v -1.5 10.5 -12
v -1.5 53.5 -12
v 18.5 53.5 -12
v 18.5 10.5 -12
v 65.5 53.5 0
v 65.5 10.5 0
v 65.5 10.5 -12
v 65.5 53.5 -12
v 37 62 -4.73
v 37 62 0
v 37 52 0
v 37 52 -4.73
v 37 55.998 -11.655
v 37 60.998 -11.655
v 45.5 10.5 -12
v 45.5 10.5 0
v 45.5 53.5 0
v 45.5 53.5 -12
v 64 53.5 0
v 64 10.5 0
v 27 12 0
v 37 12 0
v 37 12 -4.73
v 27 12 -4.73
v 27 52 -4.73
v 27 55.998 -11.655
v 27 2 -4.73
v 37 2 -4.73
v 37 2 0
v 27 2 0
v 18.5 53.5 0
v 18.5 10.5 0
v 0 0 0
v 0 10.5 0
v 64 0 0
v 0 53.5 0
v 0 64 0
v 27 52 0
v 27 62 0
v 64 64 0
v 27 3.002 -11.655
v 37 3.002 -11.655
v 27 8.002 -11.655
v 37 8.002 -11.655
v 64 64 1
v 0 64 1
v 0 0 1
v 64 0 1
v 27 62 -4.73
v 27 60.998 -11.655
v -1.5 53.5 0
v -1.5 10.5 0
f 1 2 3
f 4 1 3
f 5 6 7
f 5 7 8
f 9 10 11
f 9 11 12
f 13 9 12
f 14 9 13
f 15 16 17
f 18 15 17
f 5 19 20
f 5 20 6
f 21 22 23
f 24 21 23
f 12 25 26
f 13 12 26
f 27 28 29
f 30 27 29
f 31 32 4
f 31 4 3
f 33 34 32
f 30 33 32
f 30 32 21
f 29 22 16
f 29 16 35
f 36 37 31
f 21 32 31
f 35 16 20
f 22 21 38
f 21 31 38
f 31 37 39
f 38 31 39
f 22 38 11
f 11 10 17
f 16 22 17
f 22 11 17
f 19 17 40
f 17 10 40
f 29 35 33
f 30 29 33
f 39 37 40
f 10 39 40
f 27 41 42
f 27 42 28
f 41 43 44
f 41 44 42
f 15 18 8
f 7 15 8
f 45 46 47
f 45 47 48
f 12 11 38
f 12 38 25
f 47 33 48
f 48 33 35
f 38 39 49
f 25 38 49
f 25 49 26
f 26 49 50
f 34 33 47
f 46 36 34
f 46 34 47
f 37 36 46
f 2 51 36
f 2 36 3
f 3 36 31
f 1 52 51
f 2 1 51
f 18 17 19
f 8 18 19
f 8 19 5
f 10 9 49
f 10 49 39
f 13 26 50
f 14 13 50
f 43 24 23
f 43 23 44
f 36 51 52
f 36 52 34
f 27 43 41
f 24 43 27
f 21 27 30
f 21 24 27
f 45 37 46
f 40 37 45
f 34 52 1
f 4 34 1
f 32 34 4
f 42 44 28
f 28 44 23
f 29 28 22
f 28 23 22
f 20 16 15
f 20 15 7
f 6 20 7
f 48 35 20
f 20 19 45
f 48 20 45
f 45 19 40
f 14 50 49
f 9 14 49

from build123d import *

# Parameters (mm, degrees)
SKETCH2_W           = 64
SKETCH2_H           = 64
BOSS_EXTRUDE1_DEPTH = 1
SKETCH3_W           = 20
SKETCH3_H           = 43
BOSS_EXTRUDE2_DEPTH = 12
BOSS_EXTRUDE3_DEPTH = 10


with BuildPart() as part:
    # Sketch2 → Boss-Extrude1 (new body)
    with BuildSketch(Plane.XY):
        with Locations((32, 32)):
            Rectangle(SKETCH2_W, SKETCH2_H)
    extrude(amount=BOSS_EXTRUDE1_DEPTH)

    # Sketch3 → Boss-Extrude2 (add)
    with BuildSketch(Plane.XY):
        with Locations((8.5, 32)):
            Rectangle(SKETCH3_W, SKETCH3_H)
        with Locations((55.5, 32)):
            Rectangle(SKETCH3_W, SKETCH3_H)
    extrude(amount=-BOSS_EXTRUDE2_DEPTH)

    # Sketch5 → Boss-Extrude3 (add)
    with BuildSketch(Plane(origin=(27, 0, 0), x_dir=(0, 0, -1), z_dir=(1, 0, 0))):
        Polygon((11.654534966, 3.002134122), (4.730028144, 2), (0, 2), (0, 12), (4.730028144, 12), (11.654534966, 8.002134122), align=None)
        Polygon((0, 62), (0, 52), (4.730028144, 52), (11.654534966, 55.997865878), (11.654534966, 60.997865878), (4.730028144, 62), align=None)
    extrude(amount=BOSS_EXTRUDE3_DEPTH)


solid = part.part
